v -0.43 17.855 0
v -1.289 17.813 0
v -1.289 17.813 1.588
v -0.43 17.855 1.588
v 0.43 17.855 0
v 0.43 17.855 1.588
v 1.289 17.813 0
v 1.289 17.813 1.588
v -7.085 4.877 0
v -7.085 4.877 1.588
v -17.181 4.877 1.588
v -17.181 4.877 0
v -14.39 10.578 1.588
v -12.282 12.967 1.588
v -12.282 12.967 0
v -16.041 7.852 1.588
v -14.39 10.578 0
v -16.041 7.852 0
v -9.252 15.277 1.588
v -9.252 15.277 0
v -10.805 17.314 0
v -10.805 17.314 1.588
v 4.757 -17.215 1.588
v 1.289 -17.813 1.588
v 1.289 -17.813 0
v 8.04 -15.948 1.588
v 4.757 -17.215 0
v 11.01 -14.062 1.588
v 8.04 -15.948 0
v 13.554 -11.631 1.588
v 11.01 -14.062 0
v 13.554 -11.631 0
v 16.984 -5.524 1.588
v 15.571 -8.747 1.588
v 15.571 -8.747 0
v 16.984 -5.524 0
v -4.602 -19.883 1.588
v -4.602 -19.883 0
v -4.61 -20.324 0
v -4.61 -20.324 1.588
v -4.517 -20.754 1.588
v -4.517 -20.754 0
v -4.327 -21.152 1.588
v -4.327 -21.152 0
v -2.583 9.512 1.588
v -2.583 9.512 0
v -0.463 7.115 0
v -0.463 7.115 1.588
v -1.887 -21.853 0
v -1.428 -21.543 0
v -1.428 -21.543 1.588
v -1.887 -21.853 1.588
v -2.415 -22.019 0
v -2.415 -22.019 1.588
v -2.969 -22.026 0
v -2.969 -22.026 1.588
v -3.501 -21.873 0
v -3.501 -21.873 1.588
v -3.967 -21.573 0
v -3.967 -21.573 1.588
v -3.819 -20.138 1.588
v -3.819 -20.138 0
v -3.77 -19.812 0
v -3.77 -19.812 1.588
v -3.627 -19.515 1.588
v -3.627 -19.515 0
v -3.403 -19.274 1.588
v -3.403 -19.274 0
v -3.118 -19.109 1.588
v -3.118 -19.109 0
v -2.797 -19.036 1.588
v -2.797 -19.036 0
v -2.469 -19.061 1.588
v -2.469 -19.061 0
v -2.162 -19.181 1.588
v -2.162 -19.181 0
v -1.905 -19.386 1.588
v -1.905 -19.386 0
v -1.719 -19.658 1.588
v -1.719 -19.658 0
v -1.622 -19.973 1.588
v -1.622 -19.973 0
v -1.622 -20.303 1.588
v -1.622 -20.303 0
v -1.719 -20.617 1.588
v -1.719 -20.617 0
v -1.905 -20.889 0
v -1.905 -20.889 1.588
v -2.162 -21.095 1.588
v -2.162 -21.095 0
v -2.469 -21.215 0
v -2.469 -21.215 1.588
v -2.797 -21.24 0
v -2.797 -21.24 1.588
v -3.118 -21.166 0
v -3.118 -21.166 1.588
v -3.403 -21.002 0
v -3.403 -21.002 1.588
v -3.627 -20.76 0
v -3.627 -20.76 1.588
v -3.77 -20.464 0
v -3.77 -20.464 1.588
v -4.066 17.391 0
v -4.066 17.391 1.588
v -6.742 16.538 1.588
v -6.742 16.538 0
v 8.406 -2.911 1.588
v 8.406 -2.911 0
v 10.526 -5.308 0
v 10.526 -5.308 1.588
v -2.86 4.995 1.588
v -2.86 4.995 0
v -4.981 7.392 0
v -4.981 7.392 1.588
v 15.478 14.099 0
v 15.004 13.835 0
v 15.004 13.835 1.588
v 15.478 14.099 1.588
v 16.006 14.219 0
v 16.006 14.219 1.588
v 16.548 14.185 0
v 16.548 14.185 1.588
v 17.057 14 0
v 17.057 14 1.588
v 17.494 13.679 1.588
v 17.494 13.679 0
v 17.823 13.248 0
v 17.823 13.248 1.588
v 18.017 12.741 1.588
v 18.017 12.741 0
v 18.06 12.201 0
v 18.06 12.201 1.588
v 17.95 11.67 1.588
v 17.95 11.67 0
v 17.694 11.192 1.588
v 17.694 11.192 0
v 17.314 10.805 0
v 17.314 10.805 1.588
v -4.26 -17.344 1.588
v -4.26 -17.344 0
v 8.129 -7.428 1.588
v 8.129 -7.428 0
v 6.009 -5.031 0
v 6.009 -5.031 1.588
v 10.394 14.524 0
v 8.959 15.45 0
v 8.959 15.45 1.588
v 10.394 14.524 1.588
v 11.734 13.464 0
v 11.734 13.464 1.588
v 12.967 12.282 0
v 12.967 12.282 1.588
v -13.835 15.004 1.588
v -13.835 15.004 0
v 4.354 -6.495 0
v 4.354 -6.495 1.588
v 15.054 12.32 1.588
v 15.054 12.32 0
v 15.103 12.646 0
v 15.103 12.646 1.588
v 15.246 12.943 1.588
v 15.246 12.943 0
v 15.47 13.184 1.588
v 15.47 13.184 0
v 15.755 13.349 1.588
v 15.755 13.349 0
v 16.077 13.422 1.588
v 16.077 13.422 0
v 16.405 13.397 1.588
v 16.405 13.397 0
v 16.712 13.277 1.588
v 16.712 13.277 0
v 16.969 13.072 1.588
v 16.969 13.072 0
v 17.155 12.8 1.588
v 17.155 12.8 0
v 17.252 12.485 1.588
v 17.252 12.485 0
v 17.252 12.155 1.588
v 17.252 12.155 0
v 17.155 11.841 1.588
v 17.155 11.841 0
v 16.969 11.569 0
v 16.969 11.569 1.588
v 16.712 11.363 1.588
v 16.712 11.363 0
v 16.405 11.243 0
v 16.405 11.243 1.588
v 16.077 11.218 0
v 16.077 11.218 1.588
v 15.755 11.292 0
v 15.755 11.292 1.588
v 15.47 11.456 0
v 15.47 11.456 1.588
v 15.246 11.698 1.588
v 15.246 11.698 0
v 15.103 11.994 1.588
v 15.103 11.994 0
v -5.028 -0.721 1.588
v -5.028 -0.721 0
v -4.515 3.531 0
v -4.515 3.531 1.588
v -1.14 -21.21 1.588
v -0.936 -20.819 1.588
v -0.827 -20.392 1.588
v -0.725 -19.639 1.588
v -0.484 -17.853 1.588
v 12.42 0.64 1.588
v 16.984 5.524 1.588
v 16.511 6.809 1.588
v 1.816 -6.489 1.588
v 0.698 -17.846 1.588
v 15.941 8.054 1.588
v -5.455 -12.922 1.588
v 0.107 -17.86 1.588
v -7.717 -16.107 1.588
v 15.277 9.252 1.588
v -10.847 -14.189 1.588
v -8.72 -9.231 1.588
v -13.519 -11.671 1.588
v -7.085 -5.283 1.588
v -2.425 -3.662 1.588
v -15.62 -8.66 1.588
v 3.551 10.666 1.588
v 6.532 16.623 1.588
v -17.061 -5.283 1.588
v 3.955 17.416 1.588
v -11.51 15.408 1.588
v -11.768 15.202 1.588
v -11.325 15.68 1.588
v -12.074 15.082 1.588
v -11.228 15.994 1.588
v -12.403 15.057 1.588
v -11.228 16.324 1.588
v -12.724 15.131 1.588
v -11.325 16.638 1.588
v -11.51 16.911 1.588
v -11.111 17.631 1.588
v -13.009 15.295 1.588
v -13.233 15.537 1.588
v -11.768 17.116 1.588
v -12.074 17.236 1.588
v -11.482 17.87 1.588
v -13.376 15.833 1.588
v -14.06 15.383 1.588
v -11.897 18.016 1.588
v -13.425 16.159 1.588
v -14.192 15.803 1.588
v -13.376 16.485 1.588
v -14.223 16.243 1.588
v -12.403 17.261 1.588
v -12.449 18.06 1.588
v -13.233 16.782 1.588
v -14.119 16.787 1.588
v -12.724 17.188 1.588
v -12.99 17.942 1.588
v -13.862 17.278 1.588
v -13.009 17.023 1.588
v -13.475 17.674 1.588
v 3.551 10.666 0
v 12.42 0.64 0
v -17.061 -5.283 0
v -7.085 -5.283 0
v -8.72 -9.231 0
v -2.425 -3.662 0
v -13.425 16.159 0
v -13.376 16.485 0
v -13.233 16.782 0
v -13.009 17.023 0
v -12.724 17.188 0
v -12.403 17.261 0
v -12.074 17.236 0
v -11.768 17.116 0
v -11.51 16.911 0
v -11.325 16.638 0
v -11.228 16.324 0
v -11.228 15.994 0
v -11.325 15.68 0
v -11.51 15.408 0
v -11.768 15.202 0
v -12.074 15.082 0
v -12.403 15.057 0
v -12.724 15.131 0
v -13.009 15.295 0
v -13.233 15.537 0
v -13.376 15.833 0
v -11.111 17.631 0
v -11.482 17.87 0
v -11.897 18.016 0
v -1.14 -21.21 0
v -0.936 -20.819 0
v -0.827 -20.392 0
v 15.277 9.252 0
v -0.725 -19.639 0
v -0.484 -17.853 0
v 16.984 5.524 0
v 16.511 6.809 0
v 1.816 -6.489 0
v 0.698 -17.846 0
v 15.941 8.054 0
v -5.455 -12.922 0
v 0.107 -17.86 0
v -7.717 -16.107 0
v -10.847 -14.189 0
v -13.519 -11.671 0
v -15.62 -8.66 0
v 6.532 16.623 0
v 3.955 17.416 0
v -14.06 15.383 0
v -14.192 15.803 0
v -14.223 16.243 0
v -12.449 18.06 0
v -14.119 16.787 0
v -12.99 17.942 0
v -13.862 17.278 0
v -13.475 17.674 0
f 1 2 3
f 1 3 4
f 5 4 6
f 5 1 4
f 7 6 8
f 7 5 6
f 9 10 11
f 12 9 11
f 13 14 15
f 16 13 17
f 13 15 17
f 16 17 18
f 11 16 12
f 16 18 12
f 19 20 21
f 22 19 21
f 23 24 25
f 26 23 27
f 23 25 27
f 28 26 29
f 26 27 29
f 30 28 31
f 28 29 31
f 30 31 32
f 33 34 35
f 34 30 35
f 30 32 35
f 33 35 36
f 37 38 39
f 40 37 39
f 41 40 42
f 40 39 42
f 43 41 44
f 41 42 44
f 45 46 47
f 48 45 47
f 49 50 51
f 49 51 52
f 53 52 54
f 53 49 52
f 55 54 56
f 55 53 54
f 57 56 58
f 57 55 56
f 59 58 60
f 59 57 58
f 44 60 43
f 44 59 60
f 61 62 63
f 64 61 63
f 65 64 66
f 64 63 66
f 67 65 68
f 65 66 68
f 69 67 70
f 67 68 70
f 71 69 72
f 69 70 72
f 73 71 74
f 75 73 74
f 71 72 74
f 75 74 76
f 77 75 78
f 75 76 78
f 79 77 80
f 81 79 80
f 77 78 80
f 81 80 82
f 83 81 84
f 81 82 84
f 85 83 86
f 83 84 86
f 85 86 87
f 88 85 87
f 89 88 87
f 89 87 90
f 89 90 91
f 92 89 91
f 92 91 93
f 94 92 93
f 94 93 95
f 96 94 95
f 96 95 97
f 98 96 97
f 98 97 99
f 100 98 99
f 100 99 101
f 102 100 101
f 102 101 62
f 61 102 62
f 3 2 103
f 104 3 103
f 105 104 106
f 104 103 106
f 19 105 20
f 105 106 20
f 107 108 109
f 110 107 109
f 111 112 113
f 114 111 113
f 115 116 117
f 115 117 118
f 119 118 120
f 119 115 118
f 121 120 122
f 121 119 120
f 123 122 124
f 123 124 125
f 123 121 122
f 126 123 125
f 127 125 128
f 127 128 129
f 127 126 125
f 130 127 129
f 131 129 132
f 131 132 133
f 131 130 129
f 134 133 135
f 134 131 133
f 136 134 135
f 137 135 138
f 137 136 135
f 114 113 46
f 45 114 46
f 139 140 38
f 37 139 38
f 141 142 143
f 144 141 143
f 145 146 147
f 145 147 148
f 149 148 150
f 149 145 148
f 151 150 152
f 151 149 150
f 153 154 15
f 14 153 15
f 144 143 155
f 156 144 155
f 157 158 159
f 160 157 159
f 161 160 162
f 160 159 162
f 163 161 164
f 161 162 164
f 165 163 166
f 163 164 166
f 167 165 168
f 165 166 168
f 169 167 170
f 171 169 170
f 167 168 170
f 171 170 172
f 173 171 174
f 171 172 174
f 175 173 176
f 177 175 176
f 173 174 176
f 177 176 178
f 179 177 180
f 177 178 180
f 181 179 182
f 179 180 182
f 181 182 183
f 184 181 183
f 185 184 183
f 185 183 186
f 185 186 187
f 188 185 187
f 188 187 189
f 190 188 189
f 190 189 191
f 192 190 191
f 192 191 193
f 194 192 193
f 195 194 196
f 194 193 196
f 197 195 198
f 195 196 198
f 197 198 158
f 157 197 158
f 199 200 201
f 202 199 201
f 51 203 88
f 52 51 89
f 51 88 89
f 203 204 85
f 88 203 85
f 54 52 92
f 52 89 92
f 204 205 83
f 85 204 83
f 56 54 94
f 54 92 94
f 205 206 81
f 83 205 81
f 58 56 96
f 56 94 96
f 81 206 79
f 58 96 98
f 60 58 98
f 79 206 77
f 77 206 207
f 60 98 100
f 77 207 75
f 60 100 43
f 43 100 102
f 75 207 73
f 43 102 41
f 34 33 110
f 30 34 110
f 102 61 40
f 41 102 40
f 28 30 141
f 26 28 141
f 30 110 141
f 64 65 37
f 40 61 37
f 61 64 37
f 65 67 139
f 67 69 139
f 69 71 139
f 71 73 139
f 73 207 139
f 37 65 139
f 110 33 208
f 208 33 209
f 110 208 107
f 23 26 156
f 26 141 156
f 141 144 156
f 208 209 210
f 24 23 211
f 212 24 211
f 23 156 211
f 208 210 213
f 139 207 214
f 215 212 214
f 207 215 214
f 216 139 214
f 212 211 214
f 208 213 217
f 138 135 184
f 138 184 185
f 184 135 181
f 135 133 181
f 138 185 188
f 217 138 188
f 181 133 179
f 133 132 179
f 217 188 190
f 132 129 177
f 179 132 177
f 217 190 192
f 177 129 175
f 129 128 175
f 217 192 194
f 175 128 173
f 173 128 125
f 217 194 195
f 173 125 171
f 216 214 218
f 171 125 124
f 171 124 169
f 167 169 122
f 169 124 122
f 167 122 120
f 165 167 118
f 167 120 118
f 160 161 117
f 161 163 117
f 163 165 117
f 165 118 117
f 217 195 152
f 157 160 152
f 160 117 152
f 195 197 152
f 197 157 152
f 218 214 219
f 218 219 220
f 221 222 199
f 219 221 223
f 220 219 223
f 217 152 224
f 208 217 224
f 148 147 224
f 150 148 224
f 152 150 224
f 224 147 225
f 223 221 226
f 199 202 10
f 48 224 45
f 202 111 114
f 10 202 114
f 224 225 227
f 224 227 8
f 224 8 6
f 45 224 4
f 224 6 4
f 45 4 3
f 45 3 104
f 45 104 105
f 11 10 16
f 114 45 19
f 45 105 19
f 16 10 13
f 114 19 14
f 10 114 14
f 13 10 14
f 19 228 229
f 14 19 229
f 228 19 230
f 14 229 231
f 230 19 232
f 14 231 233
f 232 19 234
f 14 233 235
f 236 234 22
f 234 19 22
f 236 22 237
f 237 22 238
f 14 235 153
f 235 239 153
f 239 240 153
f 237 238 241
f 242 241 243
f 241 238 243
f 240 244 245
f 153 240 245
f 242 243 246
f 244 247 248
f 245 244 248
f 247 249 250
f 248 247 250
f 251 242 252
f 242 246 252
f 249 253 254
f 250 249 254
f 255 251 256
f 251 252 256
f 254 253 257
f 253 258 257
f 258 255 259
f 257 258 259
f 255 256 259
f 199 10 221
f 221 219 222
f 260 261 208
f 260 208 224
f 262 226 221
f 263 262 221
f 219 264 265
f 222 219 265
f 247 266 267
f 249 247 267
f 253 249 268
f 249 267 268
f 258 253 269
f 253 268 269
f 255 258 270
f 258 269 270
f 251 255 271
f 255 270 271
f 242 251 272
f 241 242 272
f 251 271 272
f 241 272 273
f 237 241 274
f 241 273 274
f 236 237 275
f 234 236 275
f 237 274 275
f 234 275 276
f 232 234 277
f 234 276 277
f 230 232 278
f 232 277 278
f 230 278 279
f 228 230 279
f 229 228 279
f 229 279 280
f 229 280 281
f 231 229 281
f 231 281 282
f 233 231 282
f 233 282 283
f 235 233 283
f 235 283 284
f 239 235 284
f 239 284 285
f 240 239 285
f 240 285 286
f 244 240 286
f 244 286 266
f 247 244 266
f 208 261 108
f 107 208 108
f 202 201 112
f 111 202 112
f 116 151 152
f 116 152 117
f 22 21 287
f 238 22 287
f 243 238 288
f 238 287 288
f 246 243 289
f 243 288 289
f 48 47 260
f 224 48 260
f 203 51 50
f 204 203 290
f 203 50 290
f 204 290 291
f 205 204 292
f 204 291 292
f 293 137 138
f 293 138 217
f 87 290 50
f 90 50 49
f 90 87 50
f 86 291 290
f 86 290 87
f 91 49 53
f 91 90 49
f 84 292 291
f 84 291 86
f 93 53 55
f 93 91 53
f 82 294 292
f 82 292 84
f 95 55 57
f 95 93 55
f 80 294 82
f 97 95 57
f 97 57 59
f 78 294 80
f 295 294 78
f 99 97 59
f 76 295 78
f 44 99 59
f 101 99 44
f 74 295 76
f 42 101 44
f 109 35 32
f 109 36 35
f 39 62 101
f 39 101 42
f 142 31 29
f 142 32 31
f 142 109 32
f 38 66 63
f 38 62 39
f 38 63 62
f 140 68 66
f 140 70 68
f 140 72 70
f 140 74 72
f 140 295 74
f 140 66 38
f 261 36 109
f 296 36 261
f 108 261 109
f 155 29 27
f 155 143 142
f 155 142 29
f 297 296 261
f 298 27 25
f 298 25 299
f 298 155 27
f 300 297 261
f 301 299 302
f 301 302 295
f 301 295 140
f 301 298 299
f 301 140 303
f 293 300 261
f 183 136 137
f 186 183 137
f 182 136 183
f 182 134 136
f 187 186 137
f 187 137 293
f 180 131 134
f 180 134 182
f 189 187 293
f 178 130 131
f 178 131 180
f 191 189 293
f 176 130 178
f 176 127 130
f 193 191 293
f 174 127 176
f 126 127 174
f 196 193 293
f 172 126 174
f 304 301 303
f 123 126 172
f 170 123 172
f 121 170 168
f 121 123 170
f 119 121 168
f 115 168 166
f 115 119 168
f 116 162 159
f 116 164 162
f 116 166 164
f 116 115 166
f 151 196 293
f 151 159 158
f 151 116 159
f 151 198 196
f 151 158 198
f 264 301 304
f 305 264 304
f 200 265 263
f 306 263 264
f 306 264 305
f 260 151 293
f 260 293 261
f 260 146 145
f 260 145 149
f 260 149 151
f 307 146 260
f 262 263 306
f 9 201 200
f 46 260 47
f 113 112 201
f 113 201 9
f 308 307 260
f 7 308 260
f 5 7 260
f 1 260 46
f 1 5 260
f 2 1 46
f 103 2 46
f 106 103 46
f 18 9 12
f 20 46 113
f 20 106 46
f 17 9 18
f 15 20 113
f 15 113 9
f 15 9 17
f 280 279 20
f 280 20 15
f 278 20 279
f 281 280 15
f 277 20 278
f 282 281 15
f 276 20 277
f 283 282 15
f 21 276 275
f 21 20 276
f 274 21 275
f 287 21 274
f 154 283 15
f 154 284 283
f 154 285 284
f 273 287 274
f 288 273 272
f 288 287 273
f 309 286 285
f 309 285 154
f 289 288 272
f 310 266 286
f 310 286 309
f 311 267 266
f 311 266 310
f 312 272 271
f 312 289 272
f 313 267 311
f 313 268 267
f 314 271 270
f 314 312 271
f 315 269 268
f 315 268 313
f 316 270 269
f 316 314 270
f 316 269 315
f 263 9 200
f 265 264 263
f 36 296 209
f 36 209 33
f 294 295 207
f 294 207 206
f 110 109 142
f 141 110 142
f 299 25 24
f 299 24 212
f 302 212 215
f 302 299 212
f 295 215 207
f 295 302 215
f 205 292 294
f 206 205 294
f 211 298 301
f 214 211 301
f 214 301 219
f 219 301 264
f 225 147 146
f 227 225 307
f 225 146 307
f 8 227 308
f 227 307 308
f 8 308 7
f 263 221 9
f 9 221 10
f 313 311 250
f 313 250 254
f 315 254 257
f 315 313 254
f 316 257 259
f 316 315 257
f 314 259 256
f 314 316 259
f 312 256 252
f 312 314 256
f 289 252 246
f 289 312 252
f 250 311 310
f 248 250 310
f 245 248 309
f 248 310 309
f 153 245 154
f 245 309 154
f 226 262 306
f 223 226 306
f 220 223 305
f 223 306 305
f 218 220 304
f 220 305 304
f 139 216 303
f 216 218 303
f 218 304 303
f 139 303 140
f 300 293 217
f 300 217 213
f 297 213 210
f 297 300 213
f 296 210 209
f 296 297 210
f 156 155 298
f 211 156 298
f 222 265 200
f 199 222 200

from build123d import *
from build123d.topology import SkipClean

# Parameters (mm, degrees)
SKETCH1_R           = 1.4224
BOSS_EXTRUDE1_DEPTH = 1.5875
CUT_EXTRUDE3_DEPTH  = 31.574112518
CUT_EXTRUDE4_DEPTH  = 31.574112518
SKETCH4_R           = 1.1049
BOSS_EXTRUDE2_DEPTH = 1.5875
SKETCH4_3_R         = 1.1049
CUT_EXTRUDE5_DEPTH  = 2.54


with BuildPart() as part:
    # Sketch1 → Boss-Extrude1 (new body)
    with BuildSketch(Plane.XY):
        with BuildLine():
            Line((-5.027565338, -0.720652536), (-4.515281158, 3.5306))
            Line((-4.515281158, 3.5306), (-2.860140414, 4.994714494))
            Line((-2.860140414, 4.994714494), (-4.980602482, 7.391837931))
            Line((-4.980602482, 7.391837931), (-2.583479045, 9.5123))
            Line((-2.583479045, 9.5123), (-0.463016976, 7.115176563))
            Line((-0.463016976, 7.115176563), (11.876076152, 18.030166811))
            ThreePointArc((11.876076152, 18.030166811), (-16.886200405, -13.453041882), (20.228041911, 7.546815251))
            Line((20.228041911, 7.546815251), (8.405899773, -2.910887338))
            Line((8.405899773, -2.910887338), (10.526361842, -5.308010776))
            Line((10.526361842, -5.308010776), (8.129238404, -7.428472845))
            Line((8.129238404, -7.428472845), (6.008776335, -5.031349407))
            Line((6.008776335, -5.031349407), (4.353635591, -6.495463901))
            Line((4.353635591, -6.495463901), (1.815981702, -6.489359631))
            Line((1.815981702, -6.489359631), (-5.455454601, -12.9215711))
            Line((-5.455454601, -12.9215711), (-8.720293025, -9.230761998))
            Line((-8.720293025, -9.230761998), (-2.425370717, -3.662361234))
            Line((-2.425370717, -3.662361234), (-5.027565338, -0.720652536))
        make_face()
        with Locations((0, 18.415)):
            Circle(SKETCH1_R, mode=Mode.SUBTRACT)
        with Locations((0, -18.415)):
            Circle(SKETCH1_R, mode=Mode.SUBTRACT)
    extrude(amount=BOSS_EXTRUDE1_DEPTH)

    # Sketch2 → Cut-Extrude3 (cut, through all)
    with BuildSketch(Plane.XY.offset(1.5875)):
        with BuildLine():
            Line((-7.084965338, 4.8768), (-21.031997569, 4.8768))
            ThreePointArc((-21.031997569, 4.8768), (-21.588987692, -0.209070373), (-20.933606898, -5.2832))
            Line((-20.933606898, -5.2832), (-7.084965338, -5.2832))
            Line((-7.084965338, -5.2832), (-7.084965338, 4.8768))
        make_face()
    extrude(amount=-CUT_EXTRUDE3_DEPTH, mode=Mode.SUBTRACT)

    # Sketch3 → Cut-Extrude4 (cut, through all)
    with BuildSketch(Plane(origin=(0, 0, 0), x_dir=(-1, 0, 0), z_dir=(0, 0, -1))):
        with BuildLine():
            Line((-20.871224203, -5.5245), (-16.984058744, -5.5245))
            Line((-16.984058744, -5.5245), (-16.984058744, 4.677232838))
            Line((-16.984058744, 4.677232838), (-20.228041911, 7.546815251))
            ThreePointArc((-20.228041911, 7.546815251), (-21.563910577, 1.061065789), (-20.871224203, -5.5245))
        make_face()
    extrude(amount=-CUT_EXTRUDE4_DEPTH, mode=Mode.SUBTRACT)

    # Sketch4 → Boss-Extrude2 (add)
    # profile 1 of 5: a face of its own
    with BuildSketch(Plane(origin=(0, 0, 0), x_dir=(-1, 0, 0), z_dir=(0, 0, -1))):
        with BuildLine():
            Line((-16.984058744, 5.5245), (-16.984058744, 4.677232838))
            Line((-16.984058744, 4.677232838), (-12.420130291, 0.640045174))
            Line((-12.420130291, 0.640045174), (-3.551213542, 10.666109075))
            Line((-3.551213542, 10.666109075), (-8.959431605, 15.450143591))
            ThreePointArc((-8.959431605, 15.450143591), (-11.076965007, 14.009967805), (-12.966760902, 12.28175327))
            Line((-12.966760902, 12.28175327), (-15.004080987, 13.83506338))
            ThreePointArc((-15.004080987, 13.83506338), (-17.674010029, 13.475162132), (-17.314108781, 10.80523309))
            Line((-17.314108781, 10.80523309), (-15.276788696, 9.25192298))
            ThreePointArc((-15.276788696, 9.25192298), (-16.237733521, 7.437362555), (-16.984058744, 5.5245))
        make_face()
        with Locations((-16.159094884, 12.320148235)):
            Circle(SKETCH4_R, mode=Mode.SUBTRACT)
    # profile 2 of 5: a face of its own
    with BuildSketch(Plane(origin=(0, 0, 0), x_dir=(-1, 0, 0), z_dir=(0, 0, -1))):
        with BuildLine():
            ThreePointArc((-1.288911844, -17.813395463), (-0.402766027, -17.855423019), (0.484373541, -17.853395586))
            Line((0.484373541, -17.853395586), (0.725034865, -19.638742704))
            ThreePointArc((0.725034865, -19.638742704), (0.955229003, -17.361074333), (-1.288911844, -17.813395463))
        make_face()
    # profile 3 of 5: a face of its own
    with BuildSketch(Plane(origin=(0, 0, 0), x_dir=(-1, 0, 0), z_dir=(0, 0, -1))):
        with BuildLine():
            ThreePointArc((4.327227494, -21.151907768), (2.884204284, -21.396482553), (1.427926458, -21.542727915))
            ThreePointArc((1.427926458, -21.542727915), (2.969033821, -22.025790864), (4.327227494, -21.151907768))
        make_face()
    # profile 4 of 5: a face of its own
    with BuildSketch(Plane(origin=(0, 0, 0), x_dir=(-1, 0, 0), z_dir=(0, 0, -1))):
        with BuildLine():
            ThreePointArc((1.288911844, 17.813395463), (0, 17.859965052), (-1.288911844, 17.813395463))
            ThreePointArc((-1.288911844, 17.813395463), (0, 16.9926), (1.288911844, 17.813395463))
        make_face()
    # profile 5 of 5: a face of its own
    with BuildSketch(Plane(origin=(0, 0, 0), x_dir=(-1, 0, 0), z_dir=(0, 0, -1))):
        with BuildLine():
            ThreePointArc((14.223312513, 16.242705475), (13.475162132, 17.674010029), (11.896845513, 18.016469323))
            ThreePointArc((11.896845513, 18.016469323), (13.0901575, 17.169038314), (14.223312513, 16.242705475))
        make_face()
    extrude(amount=-BOSS_EXTRUDE2_DEPTH)

    # Sketch4<3> → Cut-Extrude5 (cut)
    with SkipClean():  # the faces are left unmerged after this step: merging them gives an invalid solid
        with BuildSketch(Plane(origin=(0, 0, 0), x_dir=(-1, 0, 0), z_dir=(0, 0, -1))):
            with BuildLine():
                ThreePointArc((-20.871224203, -5.5245), (-12.595886757, -17.534872021), (1.427926458, -21.542727915))
                ThreePointArc((1.427926458, -21.542727915), (1.026270462, -21.020335978), (0.826620277, -20.392354546))
                Line((0.826620277, -20.392354546), (0.725034865, -19.638742704))
                ThreePointArc((0.725034865, -19.638742704), (-0.955229003, -19.468925667), (-1.288911844, -17.813395463))
                ThreePointArc((-1.288911844, -17.813395463), (-11.010431484, -14.062316673), (-16.984058744, -5.5245))
                Line((-16.984058744, -5.5245), (-20.871224203, -5.5245))
            make_face()
            with BuildLine():
                ThreePointArc((4.602470139, -19.883377319), (4.576225926, -20.541808877), (4.327227494, -21.151907768))
                ThreePointArc((4.327227494, -21.151907768), (14.915810742, -15.609186074), (20.933606898, -5.2832))
                Line((20.933606898, -5.2832), (17.060660873, -5.2832))
                ThreePointArc((17.060660873, -5.2832), (12.247990597, -12.998656777), (4.260223404, -17.344418359))
                Line((4.260223404, -17.344418359), (4.602470139, -19.883377319))
            make_face()
            with BuildLine():
                Line((-11.876076152, 18.030166811), (-8.959431605, 15.450143591))
                ThreePointArc((-8.959431605, 15.450143591), (-5.258647708, 17.068244665), (-1.288911844, 17.813395463))
                ThreePointArc((-1.288911844, 17.813395463), (0, 19.8374), (1.288911844, 17.813395463))
                ThreePointArc((1.288911844, 17.813395463), (5.420875683, 17.017416329), (9.25192298, 15.276788696))
                Line((9.25192298, 15.276788696), (10.80523309, 17.314108781))
                ThreePointArc((10.80523309, 17.314108781), (11.28937197, 17.76113274), (11.896845513, 18.016469323))
                ThreePointArc((11.896845513, 18.016469323), (0.01243973, 21.589996416), (-11.876076152, 18.030166811))
            make_face()
            with BuildLine():
                Line((13.83506338, 15.004080987), (12.28175327, 12.966760902))
                ThreePointArc((12.28175327, 12.966760902), (15.276744775, 9.251995502), (17.181244816, 4.8768))
                Line((17.181244816, 4.8768), (21.031997569, 4.8768))
                ThreePointArc((21.031997569, 4.8768), (18.521073783, 11.09495047), (14.223312513, 16.242705475))
                ThreePointArc((14.223312513, 16.242705475), (14.13793931, 15.589304916), (13.83506338, 15.004080987))
            make_face()
            with Locations((12.320148235, 16.159094884)):
                Circle(SKETCH4_3_R)
            with Locations((2.714545208, -20.137865932)):
                Circle(SKETCH4_3_R)
        extrude(amount=-CUT_EXTRUDE5_DEPTH, mode=Mode.SUBTRACT)


solid = part.part
